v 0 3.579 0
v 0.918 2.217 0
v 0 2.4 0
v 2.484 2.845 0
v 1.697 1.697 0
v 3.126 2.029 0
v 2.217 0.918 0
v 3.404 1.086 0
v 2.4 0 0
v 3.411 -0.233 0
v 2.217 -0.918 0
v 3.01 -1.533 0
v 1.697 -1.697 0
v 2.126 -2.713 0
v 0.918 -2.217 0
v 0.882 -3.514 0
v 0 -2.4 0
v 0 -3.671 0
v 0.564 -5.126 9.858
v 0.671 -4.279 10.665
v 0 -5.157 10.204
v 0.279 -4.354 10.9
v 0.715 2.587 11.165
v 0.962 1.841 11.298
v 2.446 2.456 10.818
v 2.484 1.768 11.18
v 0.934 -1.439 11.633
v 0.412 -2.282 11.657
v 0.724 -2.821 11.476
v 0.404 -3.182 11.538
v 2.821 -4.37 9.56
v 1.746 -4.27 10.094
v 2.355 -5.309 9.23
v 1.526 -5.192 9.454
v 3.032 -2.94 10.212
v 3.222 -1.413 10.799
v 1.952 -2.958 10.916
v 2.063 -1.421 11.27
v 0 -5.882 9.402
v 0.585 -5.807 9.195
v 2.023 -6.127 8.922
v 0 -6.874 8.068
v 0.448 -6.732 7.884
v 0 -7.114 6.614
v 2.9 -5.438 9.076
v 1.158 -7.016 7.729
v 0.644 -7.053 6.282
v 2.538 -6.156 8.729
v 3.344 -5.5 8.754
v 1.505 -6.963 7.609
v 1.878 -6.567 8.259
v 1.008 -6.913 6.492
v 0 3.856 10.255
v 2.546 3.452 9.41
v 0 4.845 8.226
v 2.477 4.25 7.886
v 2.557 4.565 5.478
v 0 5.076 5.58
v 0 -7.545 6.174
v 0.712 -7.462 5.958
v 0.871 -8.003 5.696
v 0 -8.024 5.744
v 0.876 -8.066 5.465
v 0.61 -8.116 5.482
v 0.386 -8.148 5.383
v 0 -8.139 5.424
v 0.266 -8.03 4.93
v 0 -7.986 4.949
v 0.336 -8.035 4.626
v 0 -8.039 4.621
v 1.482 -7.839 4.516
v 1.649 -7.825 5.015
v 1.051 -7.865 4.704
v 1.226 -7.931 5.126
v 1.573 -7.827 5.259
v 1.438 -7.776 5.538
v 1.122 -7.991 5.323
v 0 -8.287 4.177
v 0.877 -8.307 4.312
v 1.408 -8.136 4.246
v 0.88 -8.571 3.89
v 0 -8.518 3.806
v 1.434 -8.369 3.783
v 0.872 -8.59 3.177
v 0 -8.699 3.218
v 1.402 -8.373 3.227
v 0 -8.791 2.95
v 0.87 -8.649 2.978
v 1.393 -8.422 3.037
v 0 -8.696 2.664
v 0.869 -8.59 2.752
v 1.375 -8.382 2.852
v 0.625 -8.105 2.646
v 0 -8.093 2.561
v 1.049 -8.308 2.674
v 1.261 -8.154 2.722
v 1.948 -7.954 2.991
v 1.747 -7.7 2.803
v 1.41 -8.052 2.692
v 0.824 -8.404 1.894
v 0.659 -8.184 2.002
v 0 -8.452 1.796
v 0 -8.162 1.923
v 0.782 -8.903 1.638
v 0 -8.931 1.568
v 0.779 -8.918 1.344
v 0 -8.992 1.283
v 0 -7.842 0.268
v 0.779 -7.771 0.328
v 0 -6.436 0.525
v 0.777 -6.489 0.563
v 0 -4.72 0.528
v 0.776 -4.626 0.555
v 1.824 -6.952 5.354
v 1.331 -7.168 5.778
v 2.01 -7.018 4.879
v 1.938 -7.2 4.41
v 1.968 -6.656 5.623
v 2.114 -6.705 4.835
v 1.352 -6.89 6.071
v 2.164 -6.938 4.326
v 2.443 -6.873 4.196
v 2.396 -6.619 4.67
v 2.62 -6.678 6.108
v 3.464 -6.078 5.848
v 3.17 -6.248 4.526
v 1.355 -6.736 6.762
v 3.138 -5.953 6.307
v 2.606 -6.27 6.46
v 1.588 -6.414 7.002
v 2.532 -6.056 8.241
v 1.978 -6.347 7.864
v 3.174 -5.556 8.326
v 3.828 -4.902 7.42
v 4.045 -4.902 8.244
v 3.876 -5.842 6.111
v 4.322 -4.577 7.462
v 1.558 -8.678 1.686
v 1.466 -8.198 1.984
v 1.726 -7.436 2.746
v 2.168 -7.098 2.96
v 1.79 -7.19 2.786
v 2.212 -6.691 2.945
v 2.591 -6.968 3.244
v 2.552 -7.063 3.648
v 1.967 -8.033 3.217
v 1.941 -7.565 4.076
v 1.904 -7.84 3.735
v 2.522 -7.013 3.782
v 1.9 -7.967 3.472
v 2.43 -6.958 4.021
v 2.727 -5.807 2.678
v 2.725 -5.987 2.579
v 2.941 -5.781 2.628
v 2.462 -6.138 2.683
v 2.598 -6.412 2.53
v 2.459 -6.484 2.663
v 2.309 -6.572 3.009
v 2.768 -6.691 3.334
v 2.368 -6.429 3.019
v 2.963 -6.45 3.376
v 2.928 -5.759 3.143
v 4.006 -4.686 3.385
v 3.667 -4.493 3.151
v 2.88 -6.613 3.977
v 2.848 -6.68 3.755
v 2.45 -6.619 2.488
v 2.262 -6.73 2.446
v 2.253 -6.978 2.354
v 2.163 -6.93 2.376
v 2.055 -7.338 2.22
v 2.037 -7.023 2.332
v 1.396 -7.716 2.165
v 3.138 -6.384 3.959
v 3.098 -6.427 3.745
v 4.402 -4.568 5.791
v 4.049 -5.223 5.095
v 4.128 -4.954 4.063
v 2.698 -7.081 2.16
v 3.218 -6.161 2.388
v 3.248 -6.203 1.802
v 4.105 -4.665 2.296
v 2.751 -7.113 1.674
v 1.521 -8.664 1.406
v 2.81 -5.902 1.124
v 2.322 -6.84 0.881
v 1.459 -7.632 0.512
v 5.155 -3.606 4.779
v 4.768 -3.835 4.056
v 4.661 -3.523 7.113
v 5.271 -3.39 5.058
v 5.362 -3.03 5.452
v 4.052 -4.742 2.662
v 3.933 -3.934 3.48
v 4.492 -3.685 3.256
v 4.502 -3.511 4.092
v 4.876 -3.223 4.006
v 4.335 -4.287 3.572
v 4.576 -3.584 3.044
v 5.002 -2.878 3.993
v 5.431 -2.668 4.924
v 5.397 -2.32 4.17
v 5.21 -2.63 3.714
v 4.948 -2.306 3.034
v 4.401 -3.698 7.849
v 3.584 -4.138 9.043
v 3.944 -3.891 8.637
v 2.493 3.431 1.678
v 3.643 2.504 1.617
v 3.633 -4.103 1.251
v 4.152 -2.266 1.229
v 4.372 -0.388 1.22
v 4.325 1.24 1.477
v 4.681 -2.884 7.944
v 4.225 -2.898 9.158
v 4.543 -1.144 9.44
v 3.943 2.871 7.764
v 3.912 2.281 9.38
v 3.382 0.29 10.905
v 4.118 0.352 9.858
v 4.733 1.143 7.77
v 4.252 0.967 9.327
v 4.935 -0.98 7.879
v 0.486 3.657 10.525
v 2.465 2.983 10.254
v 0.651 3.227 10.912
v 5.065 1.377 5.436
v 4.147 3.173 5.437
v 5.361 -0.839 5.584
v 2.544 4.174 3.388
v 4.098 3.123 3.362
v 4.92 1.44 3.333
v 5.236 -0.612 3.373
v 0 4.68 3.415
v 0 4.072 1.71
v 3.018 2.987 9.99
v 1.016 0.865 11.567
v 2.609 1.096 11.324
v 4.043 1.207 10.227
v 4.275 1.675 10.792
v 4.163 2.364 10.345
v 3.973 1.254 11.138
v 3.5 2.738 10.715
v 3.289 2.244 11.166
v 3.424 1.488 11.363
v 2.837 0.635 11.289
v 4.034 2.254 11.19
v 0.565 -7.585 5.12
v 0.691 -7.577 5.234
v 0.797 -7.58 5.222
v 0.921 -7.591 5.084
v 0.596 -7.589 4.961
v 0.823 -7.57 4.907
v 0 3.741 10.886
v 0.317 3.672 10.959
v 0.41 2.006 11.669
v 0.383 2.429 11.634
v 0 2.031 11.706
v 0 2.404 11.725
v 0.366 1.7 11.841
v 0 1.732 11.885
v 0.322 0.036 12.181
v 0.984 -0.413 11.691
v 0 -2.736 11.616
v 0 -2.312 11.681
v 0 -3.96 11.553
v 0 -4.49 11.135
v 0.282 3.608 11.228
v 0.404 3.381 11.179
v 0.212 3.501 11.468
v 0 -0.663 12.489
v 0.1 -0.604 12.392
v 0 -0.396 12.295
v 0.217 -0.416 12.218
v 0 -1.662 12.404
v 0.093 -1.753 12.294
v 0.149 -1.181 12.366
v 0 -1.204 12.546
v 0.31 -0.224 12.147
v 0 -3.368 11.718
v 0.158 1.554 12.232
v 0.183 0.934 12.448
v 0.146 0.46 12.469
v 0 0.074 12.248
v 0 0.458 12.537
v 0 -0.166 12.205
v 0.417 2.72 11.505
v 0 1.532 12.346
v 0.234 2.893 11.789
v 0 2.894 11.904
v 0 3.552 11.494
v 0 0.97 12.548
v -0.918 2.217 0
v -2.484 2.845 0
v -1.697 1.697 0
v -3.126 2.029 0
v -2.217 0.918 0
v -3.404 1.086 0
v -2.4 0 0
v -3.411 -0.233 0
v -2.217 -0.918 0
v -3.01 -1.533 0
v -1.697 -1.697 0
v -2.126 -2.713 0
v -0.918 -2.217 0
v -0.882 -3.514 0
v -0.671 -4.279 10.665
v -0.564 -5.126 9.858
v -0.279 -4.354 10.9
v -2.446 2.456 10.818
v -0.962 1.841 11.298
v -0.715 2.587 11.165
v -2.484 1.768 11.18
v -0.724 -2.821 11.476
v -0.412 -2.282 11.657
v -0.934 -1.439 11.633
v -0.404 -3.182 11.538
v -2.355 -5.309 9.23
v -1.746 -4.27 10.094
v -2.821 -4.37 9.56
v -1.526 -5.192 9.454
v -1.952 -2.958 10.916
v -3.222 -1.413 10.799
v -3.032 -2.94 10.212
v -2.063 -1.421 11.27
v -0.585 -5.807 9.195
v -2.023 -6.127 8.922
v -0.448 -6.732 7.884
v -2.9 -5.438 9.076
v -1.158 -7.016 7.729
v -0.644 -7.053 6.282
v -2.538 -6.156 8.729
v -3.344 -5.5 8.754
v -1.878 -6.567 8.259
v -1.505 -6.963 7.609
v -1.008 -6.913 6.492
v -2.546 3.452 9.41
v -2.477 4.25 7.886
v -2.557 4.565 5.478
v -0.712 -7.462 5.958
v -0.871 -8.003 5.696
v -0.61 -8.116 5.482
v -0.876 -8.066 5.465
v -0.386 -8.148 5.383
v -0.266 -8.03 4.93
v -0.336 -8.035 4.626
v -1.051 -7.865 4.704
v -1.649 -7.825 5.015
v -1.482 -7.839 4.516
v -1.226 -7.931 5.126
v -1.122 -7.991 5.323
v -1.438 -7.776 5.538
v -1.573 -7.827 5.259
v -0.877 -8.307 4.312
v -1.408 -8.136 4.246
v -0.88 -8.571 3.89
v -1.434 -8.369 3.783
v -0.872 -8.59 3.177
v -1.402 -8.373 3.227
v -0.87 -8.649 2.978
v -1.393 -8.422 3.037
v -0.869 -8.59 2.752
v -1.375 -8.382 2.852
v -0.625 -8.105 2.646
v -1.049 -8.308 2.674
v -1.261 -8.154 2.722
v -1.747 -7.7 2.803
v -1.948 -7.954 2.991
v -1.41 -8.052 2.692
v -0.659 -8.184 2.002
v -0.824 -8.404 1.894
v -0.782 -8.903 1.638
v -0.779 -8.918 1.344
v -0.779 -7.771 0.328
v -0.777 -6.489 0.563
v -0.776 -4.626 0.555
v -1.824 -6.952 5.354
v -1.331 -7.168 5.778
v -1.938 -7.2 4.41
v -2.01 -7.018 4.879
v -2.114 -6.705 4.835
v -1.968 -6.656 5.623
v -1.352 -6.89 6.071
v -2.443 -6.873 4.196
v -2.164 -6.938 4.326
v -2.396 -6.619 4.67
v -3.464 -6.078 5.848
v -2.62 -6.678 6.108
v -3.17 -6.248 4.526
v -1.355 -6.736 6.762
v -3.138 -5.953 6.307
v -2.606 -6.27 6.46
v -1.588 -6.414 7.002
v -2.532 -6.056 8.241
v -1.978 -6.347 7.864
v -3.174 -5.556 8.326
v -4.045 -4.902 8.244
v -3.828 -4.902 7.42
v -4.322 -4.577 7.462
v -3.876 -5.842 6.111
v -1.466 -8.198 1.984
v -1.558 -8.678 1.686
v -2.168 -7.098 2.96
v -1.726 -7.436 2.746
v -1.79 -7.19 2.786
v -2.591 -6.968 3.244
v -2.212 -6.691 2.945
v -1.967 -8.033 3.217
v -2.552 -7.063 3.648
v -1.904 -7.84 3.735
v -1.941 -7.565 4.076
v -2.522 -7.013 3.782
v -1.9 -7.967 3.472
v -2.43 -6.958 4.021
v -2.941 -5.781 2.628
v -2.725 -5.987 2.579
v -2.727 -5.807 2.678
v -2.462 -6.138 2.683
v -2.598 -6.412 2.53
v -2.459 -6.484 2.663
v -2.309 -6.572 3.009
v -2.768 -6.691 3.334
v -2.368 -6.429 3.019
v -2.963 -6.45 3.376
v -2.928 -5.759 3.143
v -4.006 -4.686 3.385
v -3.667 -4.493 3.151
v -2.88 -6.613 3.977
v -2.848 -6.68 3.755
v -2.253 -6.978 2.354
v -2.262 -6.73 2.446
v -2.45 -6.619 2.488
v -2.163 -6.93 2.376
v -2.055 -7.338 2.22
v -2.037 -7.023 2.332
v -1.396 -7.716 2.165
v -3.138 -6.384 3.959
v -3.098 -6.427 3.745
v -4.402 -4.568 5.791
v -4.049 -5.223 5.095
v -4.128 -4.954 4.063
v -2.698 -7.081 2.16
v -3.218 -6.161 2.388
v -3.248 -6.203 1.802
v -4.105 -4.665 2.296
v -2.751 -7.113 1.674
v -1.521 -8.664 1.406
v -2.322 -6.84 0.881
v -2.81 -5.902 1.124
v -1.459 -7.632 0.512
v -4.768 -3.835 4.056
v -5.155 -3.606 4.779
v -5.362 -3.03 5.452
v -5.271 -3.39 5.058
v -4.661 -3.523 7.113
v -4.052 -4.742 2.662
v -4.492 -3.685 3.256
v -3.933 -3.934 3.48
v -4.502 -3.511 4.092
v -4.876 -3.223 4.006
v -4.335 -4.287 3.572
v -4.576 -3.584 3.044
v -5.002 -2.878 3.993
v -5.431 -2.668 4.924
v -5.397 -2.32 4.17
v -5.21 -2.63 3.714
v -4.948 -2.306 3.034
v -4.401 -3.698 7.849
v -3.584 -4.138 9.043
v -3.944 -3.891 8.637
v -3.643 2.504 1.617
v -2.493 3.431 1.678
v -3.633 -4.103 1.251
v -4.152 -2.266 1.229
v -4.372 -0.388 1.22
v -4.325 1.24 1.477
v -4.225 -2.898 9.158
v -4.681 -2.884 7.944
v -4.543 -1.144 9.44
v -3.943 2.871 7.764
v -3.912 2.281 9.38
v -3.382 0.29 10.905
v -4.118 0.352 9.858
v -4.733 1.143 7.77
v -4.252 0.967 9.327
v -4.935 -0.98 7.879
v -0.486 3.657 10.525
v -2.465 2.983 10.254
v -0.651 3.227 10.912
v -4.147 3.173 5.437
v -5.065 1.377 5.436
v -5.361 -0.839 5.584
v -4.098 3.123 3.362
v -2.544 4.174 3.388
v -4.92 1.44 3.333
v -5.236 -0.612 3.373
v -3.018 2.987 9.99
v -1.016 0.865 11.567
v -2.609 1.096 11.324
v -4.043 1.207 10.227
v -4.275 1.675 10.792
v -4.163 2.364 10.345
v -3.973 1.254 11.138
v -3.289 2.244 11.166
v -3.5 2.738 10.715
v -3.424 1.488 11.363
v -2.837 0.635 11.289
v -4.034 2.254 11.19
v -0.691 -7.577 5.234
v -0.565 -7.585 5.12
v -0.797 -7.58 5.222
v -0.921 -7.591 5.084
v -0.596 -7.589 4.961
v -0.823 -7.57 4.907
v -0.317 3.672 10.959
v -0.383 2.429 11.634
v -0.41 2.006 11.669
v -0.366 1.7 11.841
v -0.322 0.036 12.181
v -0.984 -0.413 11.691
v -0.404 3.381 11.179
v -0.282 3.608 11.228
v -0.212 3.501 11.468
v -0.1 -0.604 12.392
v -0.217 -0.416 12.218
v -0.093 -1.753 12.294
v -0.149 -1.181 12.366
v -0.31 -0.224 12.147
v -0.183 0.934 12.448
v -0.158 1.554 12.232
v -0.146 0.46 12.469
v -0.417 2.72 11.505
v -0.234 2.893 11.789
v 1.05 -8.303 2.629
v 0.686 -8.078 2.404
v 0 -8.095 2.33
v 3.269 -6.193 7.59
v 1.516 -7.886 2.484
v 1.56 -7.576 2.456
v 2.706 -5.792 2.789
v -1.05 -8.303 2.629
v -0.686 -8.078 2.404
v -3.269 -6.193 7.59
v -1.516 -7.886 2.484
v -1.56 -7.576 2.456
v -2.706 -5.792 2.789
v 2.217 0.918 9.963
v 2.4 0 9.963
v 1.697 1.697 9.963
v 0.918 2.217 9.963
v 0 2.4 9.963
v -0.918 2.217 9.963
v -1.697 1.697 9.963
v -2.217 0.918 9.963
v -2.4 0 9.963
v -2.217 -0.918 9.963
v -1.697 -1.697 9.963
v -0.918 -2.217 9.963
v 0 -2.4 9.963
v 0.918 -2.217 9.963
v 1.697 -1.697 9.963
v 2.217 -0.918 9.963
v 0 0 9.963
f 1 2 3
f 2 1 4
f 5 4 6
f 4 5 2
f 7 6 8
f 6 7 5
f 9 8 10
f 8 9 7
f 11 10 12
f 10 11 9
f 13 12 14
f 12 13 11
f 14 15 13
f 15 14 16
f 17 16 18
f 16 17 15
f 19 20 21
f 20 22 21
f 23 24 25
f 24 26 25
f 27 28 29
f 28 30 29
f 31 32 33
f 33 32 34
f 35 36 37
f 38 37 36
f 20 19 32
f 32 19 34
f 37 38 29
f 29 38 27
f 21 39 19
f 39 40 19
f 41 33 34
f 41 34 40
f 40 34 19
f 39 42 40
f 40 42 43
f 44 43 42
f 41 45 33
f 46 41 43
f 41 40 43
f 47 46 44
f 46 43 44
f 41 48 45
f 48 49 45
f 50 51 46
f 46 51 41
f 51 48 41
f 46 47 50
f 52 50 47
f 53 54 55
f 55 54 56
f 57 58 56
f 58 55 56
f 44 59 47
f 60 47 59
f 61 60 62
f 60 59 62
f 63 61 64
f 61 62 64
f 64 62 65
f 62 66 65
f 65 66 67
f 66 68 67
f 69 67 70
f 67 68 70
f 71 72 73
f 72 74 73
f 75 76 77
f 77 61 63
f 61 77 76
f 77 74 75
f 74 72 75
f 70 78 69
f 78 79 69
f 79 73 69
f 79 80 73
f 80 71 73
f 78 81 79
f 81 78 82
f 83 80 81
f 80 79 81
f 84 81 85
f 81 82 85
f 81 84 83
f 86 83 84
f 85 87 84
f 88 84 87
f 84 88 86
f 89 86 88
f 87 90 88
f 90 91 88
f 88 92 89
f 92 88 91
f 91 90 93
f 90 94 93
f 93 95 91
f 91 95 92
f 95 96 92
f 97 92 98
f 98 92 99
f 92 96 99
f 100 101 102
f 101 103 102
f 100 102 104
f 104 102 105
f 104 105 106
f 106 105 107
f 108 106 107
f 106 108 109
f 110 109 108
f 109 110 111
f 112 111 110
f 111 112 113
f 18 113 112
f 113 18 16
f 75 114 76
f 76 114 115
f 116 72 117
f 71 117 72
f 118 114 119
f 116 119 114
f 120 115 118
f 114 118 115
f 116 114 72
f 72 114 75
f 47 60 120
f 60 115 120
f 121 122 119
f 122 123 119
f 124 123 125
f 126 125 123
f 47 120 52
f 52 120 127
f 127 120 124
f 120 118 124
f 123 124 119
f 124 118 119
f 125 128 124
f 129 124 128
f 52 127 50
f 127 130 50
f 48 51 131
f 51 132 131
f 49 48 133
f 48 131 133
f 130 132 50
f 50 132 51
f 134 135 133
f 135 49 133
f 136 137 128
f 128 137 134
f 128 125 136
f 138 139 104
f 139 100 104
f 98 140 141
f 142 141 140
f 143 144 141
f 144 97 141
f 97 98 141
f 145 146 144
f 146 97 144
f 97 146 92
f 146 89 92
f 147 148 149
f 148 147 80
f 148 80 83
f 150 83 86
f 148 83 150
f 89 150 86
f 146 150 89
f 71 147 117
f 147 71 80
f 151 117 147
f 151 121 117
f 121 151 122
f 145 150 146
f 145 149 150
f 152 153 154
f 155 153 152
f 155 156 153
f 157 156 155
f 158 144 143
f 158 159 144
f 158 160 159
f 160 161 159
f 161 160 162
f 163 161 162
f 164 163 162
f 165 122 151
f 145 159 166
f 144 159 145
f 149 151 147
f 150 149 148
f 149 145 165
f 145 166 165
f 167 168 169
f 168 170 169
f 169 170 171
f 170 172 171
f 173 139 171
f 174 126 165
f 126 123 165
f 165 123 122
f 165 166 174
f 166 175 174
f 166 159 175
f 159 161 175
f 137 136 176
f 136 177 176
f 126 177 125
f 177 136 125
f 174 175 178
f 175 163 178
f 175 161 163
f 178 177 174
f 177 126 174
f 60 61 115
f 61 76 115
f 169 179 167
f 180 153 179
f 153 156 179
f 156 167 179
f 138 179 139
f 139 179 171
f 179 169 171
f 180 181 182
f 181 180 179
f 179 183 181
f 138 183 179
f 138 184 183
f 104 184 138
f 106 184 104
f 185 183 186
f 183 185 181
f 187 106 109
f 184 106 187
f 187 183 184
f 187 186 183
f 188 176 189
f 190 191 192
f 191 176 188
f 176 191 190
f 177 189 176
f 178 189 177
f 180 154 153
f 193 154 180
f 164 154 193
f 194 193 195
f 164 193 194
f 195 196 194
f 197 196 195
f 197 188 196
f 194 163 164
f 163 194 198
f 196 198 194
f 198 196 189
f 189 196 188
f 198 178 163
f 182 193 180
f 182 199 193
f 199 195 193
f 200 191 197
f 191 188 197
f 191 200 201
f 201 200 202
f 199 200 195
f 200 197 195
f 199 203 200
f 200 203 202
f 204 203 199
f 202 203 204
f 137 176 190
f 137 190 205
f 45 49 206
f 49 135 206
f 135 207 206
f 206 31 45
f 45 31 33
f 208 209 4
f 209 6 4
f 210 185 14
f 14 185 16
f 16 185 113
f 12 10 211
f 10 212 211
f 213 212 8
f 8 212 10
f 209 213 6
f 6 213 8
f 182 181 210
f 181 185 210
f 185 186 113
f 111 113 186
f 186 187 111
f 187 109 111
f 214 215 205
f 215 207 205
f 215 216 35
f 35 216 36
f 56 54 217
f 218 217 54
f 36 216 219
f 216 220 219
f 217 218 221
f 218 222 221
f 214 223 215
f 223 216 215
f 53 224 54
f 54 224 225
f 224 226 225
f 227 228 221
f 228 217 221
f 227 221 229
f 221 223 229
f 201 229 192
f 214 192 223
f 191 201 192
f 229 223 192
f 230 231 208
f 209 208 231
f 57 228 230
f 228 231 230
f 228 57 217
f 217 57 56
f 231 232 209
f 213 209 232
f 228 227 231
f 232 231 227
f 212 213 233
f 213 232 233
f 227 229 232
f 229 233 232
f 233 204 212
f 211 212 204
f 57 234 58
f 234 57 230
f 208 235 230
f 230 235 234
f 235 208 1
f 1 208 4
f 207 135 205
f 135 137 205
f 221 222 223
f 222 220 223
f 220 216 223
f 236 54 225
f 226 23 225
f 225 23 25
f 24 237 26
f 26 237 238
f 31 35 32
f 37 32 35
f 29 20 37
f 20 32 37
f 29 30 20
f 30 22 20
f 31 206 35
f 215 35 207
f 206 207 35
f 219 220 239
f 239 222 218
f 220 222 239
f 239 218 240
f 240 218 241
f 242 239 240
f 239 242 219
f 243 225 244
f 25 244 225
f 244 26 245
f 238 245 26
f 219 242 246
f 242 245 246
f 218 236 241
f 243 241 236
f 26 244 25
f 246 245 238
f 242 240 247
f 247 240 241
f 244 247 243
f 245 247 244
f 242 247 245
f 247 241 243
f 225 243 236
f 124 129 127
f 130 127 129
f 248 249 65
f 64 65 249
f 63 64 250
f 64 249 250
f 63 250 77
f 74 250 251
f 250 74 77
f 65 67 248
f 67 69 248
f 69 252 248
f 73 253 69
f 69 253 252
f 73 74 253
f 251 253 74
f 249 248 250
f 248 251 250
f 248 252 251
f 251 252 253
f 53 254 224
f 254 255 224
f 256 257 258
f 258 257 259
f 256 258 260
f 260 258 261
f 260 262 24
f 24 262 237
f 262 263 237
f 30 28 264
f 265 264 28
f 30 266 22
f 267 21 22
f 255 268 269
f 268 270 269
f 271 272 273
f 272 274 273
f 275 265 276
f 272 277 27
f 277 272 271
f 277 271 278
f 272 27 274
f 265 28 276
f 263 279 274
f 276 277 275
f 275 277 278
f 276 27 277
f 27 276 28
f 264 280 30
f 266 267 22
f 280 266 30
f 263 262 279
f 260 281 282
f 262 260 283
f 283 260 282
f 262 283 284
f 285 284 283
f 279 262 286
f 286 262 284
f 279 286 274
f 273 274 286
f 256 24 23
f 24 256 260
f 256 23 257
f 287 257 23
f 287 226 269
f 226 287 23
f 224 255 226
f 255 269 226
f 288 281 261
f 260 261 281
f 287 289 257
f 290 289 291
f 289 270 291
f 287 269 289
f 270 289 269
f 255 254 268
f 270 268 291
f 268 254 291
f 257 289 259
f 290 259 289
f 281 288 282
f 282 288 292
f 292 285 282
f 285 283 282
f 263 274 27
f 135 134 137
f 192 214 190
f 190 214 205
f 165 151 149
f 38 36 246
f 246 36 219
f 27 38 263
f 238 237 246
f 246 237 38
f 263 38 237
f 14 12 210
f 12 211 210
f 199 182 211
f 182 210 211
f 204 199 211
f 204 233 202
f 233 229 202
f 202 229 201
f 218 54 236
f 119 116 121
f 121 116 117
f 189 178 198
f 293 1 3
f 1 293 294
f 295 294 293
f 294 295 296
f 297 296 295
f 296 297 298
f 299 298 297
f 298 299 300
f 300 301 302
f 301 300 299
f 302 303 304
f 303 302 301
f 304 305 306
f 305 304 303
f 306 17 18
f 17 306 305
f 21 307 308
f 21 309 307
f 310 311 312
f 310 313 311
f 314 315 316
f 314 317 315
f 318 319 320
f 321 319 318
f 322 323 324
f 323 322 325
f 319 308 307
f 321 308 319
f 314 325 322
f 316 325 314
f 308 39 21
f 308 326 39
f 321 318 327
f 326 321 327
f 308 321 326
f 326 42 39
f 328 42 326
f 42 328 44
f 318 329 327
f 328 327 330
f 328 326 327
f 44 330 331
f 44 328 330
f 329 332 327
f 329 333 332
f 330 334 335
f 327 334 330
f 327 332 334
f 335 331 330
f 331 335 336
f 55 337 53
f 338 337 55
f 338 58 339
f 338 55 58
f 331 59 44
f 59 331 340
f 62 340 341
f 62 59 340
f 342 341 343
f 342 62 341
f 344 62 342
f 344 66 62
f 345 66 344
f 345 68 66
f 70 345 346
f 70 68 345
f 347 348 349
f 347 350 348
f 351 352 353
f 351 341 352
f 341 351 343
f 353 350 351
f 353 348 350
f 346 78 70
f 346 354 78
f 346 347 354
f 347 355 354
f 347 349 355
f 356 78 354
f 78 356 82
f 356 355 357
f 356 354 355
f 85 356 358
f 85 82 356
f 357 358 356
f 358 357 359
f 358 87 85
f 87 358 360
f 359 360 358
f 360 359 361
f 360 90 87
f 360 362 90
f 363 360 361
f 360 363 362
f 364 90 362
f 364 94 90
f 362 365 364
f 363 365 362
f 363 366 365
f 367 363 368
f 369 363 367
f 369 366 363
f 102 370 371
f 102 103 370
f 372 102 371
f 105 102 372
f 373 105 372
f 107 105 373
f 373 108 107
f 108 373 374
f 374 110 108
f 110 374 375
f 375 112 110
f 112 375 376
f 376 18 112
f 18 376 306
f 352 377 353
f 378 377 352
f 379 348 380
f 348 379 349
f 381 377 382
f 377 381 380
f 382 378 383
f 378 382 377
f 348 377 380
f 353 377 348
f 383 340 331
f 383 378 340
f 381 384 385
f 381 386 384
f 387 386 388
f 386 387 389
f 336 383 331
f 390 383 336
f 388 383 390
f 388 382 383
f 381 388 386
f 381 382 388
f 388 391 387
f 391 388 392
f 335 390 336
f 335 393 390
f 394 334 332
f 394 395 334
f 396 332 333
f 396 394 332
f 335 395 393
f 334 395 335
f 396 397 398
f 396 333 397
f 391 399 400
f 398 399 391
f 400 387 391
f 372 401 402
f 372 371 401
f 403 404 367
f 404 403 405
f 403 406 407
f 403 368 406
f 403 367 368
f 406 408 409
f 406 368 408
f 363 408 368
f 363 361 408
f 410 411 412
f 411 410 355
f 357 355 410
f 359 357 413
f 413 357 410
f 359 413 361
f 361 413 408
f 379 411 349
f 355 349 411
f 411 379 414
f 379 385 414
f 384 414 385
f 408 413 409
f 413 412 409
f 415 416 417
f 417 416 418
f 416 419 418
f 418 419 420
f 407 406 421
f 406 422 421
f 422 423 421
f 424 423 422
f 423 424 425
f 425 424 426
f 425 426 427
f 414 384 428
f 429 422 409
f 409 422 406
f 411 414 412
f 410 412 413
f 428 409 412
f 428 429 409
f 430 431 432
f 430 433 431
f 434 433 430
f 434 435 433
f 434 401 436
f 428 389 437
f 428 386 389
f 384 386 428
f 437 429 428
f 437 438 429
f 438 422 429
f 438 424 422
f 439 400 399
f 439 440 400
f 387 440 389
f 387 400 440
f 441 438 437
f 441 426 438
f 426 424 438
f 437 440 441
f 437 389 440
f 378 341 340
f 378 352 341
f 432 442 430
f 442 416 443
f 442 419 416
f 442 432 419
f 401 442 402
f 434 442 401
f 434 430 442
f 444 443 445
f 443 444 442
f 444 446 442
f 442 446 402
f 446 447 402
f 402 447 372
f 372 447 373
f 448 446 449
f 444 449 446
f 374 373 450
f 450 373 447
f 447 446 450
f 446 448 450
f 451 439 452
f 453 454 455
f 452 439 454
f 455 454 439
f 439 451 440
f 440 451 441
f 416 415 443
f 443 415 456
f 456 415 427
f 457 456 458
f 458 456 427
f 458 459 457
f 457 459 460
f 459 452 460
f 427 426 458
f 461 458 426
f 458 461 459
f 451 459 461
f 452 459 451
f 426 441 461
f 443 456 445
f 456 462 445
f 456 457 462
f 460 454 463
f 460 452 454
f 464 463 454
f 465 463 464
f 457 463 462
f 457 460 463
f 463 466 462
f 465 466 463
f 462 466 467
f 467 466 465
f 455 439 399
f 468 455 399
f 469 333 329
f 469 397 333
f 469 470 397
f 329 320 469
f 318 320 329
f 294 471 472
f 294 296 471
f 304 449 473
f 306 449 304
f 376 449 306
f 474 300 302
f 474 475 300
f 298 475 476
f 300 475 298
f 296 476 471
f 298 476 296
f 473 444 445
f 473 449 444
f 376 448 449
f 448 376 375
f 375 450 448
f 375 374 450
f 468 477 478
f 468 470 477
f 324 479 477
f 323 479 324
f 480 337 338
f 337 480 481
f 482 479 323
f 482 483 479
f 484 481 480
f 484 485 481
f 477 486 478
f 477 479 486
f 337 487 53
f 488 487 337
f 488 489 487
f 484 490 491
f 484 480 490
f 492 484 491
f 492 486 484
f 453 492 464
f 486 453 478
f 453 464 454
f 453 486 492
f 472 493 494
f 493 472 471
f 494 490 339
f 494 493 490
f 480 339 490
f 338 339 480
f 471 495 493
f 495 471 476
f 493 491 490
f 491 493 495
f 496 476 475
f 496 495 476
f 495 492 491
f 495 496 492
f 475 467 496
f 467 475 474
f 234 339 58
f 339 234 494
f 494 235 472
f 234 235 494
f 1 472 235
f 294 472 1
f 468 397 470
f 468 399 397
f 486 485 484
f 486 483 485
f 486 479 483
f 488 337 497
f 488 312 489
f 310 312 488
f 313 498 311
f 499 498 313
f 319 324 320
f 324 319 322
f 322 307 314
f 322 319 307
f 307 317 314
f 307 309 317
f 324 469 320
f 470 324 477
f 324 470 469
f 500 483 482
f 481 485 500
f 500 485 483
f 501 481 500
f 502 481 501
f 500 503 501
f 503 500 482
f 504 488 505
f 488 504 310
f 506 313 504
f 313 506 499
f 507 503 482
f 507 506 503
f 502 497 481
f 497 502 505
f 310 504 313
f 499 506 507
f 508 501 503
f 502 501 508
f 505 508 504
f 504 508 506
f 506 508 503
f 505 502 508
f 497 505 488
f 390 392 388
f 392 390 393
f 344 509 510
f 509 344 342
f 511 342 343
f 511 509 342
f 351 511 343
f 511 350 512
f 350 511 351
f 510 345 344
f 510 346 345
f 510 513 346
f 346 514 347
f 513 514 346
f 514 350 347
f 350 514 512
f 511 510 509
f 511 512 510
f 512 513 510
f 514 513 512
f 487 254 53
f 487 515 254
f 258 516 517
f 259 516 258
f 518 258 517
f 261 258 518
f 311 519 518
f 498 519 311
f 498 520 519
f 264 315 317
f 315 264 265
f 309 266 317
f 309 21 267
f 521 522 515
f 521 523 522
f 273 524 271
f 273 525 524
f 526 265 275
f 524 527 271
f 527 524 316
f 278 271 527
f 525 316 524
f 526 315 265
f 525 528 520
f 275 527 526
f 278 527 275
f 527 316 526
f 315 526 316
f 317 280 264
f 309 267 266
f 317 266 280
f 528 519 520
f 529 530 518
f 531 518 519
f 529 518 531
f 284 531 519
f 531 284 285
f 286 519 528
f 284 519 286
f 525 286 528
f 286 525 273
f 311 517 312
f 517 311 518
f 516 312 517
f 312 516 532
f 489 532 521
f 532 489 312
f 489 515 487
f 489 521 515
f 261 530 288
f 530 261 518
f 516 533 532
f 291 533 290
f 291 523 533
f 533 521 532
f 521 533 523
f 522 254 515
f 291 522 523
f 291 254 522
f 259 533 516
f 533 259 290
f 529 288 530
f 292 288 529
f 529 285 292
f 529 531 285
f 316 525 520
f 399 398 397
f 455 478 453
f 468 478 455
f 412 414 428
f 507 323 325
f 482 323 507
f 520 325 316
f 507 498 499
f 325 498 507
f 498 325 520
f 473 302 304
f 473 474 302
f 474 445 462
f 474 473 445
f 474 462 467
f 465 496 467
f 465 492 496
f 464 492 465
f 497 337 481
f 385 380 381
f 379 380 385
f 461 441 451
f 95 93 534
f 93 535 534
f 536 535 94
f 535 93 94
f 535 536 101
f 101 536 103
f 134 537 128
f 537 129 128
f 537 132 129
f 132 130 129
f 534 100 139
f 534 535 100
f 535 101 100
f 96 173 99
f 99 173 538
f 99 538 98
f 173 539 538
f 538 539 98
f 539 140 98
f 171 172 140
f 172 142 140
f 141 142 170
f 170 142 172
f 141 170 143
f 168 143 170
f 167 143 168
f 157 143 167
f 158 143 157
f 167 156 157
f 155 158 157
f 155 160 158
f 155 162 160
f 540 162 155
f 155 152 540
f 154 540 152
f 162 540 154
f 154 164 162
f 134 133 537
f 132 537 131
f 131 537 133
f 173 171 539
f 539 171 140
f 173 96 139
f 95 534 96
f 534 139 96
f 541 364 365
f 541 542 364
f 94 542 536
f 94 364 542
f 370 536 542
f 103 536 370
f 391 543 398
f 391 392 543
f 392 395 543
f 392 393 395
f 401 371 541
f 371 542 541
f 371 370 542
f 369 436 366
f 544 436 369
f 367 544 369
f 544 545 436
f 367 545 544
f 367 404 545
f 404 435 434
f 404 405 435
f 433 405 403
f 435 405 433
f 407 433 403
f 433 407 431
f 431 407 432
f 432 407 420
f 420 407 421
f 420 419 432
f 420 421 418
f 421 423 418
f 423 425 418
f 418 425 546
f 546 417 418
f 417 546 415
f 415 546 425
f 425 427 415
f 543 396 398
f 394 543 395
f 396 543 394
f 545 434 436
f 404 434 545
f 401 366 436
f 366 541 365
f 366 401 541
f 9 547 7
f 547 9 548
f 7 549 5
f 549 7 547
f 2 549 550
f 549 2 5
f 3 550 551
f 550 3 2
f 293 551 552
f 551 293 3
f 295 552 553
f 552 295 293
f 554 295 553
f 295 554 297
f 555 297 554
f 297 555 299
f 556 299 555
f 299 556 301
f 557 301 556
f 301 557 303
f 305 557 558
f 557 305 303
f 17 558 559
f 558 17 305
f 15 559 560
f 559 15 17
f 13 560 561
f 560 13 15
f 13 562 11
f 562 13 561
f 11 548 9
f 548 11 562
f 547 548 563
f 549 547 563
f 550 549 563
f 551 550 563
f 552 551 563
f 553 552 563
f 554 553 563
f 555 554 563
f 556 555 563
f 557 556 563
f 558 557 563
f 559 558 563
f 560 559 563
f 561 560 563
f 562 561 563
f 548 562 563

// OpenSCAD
use <../lib.scad>
use <../p/4-4cyli.scad>
use <../p/4-4disc.scad>
use <../p/4-4edge.scad>
use <s/87570s01.scad>
use <s/87570s02.scad>
function ldraw_lib__87570() = [
// 0 Minifig Head Trandoshan
// 0 Name: 87570.dat
// 0 Author: Stan Isachenko [angmarec]
// 0 !LDRAW_ORG Part UPDATE 2019-02
// 0 !LICENSE Licensed under CC BY 2.0 and CC BY 4.0 : see CAreadme.txt
// 
// 0 BFC CERTIFY CCW
  [0,"BFC","CERTIFY"],
  [0,"BFC","CCW"],
// 
// 0 !KEYWORDS Boosk, Star Wars
// 
// 0 !HISTORY 2011-10-27 {LEGO Digital Designer} Original part shape
// 0 !HISTORY 2011-10-29 [angmarec] File preparation for LDraw Parts Tracker
// 0 !HISTORY 2019-06-19 [GeraldLasser] Included Patternable Area
// 0 !HISTORY 2019-09-09 [PTadmin] Official Update 2019-02
// 
// 
// 1 16 0 0 0 1 0 0 0 1 0 0 0 1 s\87570s01.dat
  [1,16,0,0,0,1,0,0,0,1,0,0,0,1, ldraw_lib__s__87570s01()],
// 1 16 0 0 0 -1 0 0 0 1 0 0 0 1 s\87570s01.dat
  [1,16,0,0,0,-1,0,0,0,1,0,0,0,1, ldraw_lib__s__87570s01()],
// 1 16 0 0 0 1 0 0 0 1 0 0 0 1 s\87570s02.dat
  [1,16,0,0,0,1,0,0,0,1,0,0,0,1, ldraw_lib__s__87570s02()],
// 1 16 0 0 0 -1 0 0 0 1 0 0 0 1 s\87570s02.dat
  [1,16,0,0,0,-1,0,0,0,1,0,0,0,1, ldraw_lib__s__87570s02()],
// 
// 0 BFC INVERTNEXT
  [0,"BFC","INVERTNEXT"],
// 1 16 0 -24.908 0 6 0 0 0 24.908 0 0 0 6 4-4cyli.dat
  [1,16,0,-24.908,0,6,0,0,0,24.908,0,0,0,6, ldraw_lib__4_4cyli()],
// 1 16 0 -24.908 0 6 0 0 0 -1 0 0 0 6 4-4disc.dat
  [1,16,0,-24.908,0,6,0,0,0,-1,0,0,0,6, ldraw_lib__4_4disc()],
// 1 16 0 -24.908 0 6 0 0 0 1 0 0 0 6 4-4edge.dat
  [1,16,0,-24.908,0,6,0,0,0,1,0,0,0,6, ldraw_lib__4_4edge()],
// 1 16 0 0 0 6 0 0 0 1 0 0 0 6 4-4edge.dat
  [1,16,0,0,0,6,0,0,0,1,0,0,0,6, ldraw_lib__4_4edge()],
];
makepoly(ldraw_lib__87570(), line=0.2);
